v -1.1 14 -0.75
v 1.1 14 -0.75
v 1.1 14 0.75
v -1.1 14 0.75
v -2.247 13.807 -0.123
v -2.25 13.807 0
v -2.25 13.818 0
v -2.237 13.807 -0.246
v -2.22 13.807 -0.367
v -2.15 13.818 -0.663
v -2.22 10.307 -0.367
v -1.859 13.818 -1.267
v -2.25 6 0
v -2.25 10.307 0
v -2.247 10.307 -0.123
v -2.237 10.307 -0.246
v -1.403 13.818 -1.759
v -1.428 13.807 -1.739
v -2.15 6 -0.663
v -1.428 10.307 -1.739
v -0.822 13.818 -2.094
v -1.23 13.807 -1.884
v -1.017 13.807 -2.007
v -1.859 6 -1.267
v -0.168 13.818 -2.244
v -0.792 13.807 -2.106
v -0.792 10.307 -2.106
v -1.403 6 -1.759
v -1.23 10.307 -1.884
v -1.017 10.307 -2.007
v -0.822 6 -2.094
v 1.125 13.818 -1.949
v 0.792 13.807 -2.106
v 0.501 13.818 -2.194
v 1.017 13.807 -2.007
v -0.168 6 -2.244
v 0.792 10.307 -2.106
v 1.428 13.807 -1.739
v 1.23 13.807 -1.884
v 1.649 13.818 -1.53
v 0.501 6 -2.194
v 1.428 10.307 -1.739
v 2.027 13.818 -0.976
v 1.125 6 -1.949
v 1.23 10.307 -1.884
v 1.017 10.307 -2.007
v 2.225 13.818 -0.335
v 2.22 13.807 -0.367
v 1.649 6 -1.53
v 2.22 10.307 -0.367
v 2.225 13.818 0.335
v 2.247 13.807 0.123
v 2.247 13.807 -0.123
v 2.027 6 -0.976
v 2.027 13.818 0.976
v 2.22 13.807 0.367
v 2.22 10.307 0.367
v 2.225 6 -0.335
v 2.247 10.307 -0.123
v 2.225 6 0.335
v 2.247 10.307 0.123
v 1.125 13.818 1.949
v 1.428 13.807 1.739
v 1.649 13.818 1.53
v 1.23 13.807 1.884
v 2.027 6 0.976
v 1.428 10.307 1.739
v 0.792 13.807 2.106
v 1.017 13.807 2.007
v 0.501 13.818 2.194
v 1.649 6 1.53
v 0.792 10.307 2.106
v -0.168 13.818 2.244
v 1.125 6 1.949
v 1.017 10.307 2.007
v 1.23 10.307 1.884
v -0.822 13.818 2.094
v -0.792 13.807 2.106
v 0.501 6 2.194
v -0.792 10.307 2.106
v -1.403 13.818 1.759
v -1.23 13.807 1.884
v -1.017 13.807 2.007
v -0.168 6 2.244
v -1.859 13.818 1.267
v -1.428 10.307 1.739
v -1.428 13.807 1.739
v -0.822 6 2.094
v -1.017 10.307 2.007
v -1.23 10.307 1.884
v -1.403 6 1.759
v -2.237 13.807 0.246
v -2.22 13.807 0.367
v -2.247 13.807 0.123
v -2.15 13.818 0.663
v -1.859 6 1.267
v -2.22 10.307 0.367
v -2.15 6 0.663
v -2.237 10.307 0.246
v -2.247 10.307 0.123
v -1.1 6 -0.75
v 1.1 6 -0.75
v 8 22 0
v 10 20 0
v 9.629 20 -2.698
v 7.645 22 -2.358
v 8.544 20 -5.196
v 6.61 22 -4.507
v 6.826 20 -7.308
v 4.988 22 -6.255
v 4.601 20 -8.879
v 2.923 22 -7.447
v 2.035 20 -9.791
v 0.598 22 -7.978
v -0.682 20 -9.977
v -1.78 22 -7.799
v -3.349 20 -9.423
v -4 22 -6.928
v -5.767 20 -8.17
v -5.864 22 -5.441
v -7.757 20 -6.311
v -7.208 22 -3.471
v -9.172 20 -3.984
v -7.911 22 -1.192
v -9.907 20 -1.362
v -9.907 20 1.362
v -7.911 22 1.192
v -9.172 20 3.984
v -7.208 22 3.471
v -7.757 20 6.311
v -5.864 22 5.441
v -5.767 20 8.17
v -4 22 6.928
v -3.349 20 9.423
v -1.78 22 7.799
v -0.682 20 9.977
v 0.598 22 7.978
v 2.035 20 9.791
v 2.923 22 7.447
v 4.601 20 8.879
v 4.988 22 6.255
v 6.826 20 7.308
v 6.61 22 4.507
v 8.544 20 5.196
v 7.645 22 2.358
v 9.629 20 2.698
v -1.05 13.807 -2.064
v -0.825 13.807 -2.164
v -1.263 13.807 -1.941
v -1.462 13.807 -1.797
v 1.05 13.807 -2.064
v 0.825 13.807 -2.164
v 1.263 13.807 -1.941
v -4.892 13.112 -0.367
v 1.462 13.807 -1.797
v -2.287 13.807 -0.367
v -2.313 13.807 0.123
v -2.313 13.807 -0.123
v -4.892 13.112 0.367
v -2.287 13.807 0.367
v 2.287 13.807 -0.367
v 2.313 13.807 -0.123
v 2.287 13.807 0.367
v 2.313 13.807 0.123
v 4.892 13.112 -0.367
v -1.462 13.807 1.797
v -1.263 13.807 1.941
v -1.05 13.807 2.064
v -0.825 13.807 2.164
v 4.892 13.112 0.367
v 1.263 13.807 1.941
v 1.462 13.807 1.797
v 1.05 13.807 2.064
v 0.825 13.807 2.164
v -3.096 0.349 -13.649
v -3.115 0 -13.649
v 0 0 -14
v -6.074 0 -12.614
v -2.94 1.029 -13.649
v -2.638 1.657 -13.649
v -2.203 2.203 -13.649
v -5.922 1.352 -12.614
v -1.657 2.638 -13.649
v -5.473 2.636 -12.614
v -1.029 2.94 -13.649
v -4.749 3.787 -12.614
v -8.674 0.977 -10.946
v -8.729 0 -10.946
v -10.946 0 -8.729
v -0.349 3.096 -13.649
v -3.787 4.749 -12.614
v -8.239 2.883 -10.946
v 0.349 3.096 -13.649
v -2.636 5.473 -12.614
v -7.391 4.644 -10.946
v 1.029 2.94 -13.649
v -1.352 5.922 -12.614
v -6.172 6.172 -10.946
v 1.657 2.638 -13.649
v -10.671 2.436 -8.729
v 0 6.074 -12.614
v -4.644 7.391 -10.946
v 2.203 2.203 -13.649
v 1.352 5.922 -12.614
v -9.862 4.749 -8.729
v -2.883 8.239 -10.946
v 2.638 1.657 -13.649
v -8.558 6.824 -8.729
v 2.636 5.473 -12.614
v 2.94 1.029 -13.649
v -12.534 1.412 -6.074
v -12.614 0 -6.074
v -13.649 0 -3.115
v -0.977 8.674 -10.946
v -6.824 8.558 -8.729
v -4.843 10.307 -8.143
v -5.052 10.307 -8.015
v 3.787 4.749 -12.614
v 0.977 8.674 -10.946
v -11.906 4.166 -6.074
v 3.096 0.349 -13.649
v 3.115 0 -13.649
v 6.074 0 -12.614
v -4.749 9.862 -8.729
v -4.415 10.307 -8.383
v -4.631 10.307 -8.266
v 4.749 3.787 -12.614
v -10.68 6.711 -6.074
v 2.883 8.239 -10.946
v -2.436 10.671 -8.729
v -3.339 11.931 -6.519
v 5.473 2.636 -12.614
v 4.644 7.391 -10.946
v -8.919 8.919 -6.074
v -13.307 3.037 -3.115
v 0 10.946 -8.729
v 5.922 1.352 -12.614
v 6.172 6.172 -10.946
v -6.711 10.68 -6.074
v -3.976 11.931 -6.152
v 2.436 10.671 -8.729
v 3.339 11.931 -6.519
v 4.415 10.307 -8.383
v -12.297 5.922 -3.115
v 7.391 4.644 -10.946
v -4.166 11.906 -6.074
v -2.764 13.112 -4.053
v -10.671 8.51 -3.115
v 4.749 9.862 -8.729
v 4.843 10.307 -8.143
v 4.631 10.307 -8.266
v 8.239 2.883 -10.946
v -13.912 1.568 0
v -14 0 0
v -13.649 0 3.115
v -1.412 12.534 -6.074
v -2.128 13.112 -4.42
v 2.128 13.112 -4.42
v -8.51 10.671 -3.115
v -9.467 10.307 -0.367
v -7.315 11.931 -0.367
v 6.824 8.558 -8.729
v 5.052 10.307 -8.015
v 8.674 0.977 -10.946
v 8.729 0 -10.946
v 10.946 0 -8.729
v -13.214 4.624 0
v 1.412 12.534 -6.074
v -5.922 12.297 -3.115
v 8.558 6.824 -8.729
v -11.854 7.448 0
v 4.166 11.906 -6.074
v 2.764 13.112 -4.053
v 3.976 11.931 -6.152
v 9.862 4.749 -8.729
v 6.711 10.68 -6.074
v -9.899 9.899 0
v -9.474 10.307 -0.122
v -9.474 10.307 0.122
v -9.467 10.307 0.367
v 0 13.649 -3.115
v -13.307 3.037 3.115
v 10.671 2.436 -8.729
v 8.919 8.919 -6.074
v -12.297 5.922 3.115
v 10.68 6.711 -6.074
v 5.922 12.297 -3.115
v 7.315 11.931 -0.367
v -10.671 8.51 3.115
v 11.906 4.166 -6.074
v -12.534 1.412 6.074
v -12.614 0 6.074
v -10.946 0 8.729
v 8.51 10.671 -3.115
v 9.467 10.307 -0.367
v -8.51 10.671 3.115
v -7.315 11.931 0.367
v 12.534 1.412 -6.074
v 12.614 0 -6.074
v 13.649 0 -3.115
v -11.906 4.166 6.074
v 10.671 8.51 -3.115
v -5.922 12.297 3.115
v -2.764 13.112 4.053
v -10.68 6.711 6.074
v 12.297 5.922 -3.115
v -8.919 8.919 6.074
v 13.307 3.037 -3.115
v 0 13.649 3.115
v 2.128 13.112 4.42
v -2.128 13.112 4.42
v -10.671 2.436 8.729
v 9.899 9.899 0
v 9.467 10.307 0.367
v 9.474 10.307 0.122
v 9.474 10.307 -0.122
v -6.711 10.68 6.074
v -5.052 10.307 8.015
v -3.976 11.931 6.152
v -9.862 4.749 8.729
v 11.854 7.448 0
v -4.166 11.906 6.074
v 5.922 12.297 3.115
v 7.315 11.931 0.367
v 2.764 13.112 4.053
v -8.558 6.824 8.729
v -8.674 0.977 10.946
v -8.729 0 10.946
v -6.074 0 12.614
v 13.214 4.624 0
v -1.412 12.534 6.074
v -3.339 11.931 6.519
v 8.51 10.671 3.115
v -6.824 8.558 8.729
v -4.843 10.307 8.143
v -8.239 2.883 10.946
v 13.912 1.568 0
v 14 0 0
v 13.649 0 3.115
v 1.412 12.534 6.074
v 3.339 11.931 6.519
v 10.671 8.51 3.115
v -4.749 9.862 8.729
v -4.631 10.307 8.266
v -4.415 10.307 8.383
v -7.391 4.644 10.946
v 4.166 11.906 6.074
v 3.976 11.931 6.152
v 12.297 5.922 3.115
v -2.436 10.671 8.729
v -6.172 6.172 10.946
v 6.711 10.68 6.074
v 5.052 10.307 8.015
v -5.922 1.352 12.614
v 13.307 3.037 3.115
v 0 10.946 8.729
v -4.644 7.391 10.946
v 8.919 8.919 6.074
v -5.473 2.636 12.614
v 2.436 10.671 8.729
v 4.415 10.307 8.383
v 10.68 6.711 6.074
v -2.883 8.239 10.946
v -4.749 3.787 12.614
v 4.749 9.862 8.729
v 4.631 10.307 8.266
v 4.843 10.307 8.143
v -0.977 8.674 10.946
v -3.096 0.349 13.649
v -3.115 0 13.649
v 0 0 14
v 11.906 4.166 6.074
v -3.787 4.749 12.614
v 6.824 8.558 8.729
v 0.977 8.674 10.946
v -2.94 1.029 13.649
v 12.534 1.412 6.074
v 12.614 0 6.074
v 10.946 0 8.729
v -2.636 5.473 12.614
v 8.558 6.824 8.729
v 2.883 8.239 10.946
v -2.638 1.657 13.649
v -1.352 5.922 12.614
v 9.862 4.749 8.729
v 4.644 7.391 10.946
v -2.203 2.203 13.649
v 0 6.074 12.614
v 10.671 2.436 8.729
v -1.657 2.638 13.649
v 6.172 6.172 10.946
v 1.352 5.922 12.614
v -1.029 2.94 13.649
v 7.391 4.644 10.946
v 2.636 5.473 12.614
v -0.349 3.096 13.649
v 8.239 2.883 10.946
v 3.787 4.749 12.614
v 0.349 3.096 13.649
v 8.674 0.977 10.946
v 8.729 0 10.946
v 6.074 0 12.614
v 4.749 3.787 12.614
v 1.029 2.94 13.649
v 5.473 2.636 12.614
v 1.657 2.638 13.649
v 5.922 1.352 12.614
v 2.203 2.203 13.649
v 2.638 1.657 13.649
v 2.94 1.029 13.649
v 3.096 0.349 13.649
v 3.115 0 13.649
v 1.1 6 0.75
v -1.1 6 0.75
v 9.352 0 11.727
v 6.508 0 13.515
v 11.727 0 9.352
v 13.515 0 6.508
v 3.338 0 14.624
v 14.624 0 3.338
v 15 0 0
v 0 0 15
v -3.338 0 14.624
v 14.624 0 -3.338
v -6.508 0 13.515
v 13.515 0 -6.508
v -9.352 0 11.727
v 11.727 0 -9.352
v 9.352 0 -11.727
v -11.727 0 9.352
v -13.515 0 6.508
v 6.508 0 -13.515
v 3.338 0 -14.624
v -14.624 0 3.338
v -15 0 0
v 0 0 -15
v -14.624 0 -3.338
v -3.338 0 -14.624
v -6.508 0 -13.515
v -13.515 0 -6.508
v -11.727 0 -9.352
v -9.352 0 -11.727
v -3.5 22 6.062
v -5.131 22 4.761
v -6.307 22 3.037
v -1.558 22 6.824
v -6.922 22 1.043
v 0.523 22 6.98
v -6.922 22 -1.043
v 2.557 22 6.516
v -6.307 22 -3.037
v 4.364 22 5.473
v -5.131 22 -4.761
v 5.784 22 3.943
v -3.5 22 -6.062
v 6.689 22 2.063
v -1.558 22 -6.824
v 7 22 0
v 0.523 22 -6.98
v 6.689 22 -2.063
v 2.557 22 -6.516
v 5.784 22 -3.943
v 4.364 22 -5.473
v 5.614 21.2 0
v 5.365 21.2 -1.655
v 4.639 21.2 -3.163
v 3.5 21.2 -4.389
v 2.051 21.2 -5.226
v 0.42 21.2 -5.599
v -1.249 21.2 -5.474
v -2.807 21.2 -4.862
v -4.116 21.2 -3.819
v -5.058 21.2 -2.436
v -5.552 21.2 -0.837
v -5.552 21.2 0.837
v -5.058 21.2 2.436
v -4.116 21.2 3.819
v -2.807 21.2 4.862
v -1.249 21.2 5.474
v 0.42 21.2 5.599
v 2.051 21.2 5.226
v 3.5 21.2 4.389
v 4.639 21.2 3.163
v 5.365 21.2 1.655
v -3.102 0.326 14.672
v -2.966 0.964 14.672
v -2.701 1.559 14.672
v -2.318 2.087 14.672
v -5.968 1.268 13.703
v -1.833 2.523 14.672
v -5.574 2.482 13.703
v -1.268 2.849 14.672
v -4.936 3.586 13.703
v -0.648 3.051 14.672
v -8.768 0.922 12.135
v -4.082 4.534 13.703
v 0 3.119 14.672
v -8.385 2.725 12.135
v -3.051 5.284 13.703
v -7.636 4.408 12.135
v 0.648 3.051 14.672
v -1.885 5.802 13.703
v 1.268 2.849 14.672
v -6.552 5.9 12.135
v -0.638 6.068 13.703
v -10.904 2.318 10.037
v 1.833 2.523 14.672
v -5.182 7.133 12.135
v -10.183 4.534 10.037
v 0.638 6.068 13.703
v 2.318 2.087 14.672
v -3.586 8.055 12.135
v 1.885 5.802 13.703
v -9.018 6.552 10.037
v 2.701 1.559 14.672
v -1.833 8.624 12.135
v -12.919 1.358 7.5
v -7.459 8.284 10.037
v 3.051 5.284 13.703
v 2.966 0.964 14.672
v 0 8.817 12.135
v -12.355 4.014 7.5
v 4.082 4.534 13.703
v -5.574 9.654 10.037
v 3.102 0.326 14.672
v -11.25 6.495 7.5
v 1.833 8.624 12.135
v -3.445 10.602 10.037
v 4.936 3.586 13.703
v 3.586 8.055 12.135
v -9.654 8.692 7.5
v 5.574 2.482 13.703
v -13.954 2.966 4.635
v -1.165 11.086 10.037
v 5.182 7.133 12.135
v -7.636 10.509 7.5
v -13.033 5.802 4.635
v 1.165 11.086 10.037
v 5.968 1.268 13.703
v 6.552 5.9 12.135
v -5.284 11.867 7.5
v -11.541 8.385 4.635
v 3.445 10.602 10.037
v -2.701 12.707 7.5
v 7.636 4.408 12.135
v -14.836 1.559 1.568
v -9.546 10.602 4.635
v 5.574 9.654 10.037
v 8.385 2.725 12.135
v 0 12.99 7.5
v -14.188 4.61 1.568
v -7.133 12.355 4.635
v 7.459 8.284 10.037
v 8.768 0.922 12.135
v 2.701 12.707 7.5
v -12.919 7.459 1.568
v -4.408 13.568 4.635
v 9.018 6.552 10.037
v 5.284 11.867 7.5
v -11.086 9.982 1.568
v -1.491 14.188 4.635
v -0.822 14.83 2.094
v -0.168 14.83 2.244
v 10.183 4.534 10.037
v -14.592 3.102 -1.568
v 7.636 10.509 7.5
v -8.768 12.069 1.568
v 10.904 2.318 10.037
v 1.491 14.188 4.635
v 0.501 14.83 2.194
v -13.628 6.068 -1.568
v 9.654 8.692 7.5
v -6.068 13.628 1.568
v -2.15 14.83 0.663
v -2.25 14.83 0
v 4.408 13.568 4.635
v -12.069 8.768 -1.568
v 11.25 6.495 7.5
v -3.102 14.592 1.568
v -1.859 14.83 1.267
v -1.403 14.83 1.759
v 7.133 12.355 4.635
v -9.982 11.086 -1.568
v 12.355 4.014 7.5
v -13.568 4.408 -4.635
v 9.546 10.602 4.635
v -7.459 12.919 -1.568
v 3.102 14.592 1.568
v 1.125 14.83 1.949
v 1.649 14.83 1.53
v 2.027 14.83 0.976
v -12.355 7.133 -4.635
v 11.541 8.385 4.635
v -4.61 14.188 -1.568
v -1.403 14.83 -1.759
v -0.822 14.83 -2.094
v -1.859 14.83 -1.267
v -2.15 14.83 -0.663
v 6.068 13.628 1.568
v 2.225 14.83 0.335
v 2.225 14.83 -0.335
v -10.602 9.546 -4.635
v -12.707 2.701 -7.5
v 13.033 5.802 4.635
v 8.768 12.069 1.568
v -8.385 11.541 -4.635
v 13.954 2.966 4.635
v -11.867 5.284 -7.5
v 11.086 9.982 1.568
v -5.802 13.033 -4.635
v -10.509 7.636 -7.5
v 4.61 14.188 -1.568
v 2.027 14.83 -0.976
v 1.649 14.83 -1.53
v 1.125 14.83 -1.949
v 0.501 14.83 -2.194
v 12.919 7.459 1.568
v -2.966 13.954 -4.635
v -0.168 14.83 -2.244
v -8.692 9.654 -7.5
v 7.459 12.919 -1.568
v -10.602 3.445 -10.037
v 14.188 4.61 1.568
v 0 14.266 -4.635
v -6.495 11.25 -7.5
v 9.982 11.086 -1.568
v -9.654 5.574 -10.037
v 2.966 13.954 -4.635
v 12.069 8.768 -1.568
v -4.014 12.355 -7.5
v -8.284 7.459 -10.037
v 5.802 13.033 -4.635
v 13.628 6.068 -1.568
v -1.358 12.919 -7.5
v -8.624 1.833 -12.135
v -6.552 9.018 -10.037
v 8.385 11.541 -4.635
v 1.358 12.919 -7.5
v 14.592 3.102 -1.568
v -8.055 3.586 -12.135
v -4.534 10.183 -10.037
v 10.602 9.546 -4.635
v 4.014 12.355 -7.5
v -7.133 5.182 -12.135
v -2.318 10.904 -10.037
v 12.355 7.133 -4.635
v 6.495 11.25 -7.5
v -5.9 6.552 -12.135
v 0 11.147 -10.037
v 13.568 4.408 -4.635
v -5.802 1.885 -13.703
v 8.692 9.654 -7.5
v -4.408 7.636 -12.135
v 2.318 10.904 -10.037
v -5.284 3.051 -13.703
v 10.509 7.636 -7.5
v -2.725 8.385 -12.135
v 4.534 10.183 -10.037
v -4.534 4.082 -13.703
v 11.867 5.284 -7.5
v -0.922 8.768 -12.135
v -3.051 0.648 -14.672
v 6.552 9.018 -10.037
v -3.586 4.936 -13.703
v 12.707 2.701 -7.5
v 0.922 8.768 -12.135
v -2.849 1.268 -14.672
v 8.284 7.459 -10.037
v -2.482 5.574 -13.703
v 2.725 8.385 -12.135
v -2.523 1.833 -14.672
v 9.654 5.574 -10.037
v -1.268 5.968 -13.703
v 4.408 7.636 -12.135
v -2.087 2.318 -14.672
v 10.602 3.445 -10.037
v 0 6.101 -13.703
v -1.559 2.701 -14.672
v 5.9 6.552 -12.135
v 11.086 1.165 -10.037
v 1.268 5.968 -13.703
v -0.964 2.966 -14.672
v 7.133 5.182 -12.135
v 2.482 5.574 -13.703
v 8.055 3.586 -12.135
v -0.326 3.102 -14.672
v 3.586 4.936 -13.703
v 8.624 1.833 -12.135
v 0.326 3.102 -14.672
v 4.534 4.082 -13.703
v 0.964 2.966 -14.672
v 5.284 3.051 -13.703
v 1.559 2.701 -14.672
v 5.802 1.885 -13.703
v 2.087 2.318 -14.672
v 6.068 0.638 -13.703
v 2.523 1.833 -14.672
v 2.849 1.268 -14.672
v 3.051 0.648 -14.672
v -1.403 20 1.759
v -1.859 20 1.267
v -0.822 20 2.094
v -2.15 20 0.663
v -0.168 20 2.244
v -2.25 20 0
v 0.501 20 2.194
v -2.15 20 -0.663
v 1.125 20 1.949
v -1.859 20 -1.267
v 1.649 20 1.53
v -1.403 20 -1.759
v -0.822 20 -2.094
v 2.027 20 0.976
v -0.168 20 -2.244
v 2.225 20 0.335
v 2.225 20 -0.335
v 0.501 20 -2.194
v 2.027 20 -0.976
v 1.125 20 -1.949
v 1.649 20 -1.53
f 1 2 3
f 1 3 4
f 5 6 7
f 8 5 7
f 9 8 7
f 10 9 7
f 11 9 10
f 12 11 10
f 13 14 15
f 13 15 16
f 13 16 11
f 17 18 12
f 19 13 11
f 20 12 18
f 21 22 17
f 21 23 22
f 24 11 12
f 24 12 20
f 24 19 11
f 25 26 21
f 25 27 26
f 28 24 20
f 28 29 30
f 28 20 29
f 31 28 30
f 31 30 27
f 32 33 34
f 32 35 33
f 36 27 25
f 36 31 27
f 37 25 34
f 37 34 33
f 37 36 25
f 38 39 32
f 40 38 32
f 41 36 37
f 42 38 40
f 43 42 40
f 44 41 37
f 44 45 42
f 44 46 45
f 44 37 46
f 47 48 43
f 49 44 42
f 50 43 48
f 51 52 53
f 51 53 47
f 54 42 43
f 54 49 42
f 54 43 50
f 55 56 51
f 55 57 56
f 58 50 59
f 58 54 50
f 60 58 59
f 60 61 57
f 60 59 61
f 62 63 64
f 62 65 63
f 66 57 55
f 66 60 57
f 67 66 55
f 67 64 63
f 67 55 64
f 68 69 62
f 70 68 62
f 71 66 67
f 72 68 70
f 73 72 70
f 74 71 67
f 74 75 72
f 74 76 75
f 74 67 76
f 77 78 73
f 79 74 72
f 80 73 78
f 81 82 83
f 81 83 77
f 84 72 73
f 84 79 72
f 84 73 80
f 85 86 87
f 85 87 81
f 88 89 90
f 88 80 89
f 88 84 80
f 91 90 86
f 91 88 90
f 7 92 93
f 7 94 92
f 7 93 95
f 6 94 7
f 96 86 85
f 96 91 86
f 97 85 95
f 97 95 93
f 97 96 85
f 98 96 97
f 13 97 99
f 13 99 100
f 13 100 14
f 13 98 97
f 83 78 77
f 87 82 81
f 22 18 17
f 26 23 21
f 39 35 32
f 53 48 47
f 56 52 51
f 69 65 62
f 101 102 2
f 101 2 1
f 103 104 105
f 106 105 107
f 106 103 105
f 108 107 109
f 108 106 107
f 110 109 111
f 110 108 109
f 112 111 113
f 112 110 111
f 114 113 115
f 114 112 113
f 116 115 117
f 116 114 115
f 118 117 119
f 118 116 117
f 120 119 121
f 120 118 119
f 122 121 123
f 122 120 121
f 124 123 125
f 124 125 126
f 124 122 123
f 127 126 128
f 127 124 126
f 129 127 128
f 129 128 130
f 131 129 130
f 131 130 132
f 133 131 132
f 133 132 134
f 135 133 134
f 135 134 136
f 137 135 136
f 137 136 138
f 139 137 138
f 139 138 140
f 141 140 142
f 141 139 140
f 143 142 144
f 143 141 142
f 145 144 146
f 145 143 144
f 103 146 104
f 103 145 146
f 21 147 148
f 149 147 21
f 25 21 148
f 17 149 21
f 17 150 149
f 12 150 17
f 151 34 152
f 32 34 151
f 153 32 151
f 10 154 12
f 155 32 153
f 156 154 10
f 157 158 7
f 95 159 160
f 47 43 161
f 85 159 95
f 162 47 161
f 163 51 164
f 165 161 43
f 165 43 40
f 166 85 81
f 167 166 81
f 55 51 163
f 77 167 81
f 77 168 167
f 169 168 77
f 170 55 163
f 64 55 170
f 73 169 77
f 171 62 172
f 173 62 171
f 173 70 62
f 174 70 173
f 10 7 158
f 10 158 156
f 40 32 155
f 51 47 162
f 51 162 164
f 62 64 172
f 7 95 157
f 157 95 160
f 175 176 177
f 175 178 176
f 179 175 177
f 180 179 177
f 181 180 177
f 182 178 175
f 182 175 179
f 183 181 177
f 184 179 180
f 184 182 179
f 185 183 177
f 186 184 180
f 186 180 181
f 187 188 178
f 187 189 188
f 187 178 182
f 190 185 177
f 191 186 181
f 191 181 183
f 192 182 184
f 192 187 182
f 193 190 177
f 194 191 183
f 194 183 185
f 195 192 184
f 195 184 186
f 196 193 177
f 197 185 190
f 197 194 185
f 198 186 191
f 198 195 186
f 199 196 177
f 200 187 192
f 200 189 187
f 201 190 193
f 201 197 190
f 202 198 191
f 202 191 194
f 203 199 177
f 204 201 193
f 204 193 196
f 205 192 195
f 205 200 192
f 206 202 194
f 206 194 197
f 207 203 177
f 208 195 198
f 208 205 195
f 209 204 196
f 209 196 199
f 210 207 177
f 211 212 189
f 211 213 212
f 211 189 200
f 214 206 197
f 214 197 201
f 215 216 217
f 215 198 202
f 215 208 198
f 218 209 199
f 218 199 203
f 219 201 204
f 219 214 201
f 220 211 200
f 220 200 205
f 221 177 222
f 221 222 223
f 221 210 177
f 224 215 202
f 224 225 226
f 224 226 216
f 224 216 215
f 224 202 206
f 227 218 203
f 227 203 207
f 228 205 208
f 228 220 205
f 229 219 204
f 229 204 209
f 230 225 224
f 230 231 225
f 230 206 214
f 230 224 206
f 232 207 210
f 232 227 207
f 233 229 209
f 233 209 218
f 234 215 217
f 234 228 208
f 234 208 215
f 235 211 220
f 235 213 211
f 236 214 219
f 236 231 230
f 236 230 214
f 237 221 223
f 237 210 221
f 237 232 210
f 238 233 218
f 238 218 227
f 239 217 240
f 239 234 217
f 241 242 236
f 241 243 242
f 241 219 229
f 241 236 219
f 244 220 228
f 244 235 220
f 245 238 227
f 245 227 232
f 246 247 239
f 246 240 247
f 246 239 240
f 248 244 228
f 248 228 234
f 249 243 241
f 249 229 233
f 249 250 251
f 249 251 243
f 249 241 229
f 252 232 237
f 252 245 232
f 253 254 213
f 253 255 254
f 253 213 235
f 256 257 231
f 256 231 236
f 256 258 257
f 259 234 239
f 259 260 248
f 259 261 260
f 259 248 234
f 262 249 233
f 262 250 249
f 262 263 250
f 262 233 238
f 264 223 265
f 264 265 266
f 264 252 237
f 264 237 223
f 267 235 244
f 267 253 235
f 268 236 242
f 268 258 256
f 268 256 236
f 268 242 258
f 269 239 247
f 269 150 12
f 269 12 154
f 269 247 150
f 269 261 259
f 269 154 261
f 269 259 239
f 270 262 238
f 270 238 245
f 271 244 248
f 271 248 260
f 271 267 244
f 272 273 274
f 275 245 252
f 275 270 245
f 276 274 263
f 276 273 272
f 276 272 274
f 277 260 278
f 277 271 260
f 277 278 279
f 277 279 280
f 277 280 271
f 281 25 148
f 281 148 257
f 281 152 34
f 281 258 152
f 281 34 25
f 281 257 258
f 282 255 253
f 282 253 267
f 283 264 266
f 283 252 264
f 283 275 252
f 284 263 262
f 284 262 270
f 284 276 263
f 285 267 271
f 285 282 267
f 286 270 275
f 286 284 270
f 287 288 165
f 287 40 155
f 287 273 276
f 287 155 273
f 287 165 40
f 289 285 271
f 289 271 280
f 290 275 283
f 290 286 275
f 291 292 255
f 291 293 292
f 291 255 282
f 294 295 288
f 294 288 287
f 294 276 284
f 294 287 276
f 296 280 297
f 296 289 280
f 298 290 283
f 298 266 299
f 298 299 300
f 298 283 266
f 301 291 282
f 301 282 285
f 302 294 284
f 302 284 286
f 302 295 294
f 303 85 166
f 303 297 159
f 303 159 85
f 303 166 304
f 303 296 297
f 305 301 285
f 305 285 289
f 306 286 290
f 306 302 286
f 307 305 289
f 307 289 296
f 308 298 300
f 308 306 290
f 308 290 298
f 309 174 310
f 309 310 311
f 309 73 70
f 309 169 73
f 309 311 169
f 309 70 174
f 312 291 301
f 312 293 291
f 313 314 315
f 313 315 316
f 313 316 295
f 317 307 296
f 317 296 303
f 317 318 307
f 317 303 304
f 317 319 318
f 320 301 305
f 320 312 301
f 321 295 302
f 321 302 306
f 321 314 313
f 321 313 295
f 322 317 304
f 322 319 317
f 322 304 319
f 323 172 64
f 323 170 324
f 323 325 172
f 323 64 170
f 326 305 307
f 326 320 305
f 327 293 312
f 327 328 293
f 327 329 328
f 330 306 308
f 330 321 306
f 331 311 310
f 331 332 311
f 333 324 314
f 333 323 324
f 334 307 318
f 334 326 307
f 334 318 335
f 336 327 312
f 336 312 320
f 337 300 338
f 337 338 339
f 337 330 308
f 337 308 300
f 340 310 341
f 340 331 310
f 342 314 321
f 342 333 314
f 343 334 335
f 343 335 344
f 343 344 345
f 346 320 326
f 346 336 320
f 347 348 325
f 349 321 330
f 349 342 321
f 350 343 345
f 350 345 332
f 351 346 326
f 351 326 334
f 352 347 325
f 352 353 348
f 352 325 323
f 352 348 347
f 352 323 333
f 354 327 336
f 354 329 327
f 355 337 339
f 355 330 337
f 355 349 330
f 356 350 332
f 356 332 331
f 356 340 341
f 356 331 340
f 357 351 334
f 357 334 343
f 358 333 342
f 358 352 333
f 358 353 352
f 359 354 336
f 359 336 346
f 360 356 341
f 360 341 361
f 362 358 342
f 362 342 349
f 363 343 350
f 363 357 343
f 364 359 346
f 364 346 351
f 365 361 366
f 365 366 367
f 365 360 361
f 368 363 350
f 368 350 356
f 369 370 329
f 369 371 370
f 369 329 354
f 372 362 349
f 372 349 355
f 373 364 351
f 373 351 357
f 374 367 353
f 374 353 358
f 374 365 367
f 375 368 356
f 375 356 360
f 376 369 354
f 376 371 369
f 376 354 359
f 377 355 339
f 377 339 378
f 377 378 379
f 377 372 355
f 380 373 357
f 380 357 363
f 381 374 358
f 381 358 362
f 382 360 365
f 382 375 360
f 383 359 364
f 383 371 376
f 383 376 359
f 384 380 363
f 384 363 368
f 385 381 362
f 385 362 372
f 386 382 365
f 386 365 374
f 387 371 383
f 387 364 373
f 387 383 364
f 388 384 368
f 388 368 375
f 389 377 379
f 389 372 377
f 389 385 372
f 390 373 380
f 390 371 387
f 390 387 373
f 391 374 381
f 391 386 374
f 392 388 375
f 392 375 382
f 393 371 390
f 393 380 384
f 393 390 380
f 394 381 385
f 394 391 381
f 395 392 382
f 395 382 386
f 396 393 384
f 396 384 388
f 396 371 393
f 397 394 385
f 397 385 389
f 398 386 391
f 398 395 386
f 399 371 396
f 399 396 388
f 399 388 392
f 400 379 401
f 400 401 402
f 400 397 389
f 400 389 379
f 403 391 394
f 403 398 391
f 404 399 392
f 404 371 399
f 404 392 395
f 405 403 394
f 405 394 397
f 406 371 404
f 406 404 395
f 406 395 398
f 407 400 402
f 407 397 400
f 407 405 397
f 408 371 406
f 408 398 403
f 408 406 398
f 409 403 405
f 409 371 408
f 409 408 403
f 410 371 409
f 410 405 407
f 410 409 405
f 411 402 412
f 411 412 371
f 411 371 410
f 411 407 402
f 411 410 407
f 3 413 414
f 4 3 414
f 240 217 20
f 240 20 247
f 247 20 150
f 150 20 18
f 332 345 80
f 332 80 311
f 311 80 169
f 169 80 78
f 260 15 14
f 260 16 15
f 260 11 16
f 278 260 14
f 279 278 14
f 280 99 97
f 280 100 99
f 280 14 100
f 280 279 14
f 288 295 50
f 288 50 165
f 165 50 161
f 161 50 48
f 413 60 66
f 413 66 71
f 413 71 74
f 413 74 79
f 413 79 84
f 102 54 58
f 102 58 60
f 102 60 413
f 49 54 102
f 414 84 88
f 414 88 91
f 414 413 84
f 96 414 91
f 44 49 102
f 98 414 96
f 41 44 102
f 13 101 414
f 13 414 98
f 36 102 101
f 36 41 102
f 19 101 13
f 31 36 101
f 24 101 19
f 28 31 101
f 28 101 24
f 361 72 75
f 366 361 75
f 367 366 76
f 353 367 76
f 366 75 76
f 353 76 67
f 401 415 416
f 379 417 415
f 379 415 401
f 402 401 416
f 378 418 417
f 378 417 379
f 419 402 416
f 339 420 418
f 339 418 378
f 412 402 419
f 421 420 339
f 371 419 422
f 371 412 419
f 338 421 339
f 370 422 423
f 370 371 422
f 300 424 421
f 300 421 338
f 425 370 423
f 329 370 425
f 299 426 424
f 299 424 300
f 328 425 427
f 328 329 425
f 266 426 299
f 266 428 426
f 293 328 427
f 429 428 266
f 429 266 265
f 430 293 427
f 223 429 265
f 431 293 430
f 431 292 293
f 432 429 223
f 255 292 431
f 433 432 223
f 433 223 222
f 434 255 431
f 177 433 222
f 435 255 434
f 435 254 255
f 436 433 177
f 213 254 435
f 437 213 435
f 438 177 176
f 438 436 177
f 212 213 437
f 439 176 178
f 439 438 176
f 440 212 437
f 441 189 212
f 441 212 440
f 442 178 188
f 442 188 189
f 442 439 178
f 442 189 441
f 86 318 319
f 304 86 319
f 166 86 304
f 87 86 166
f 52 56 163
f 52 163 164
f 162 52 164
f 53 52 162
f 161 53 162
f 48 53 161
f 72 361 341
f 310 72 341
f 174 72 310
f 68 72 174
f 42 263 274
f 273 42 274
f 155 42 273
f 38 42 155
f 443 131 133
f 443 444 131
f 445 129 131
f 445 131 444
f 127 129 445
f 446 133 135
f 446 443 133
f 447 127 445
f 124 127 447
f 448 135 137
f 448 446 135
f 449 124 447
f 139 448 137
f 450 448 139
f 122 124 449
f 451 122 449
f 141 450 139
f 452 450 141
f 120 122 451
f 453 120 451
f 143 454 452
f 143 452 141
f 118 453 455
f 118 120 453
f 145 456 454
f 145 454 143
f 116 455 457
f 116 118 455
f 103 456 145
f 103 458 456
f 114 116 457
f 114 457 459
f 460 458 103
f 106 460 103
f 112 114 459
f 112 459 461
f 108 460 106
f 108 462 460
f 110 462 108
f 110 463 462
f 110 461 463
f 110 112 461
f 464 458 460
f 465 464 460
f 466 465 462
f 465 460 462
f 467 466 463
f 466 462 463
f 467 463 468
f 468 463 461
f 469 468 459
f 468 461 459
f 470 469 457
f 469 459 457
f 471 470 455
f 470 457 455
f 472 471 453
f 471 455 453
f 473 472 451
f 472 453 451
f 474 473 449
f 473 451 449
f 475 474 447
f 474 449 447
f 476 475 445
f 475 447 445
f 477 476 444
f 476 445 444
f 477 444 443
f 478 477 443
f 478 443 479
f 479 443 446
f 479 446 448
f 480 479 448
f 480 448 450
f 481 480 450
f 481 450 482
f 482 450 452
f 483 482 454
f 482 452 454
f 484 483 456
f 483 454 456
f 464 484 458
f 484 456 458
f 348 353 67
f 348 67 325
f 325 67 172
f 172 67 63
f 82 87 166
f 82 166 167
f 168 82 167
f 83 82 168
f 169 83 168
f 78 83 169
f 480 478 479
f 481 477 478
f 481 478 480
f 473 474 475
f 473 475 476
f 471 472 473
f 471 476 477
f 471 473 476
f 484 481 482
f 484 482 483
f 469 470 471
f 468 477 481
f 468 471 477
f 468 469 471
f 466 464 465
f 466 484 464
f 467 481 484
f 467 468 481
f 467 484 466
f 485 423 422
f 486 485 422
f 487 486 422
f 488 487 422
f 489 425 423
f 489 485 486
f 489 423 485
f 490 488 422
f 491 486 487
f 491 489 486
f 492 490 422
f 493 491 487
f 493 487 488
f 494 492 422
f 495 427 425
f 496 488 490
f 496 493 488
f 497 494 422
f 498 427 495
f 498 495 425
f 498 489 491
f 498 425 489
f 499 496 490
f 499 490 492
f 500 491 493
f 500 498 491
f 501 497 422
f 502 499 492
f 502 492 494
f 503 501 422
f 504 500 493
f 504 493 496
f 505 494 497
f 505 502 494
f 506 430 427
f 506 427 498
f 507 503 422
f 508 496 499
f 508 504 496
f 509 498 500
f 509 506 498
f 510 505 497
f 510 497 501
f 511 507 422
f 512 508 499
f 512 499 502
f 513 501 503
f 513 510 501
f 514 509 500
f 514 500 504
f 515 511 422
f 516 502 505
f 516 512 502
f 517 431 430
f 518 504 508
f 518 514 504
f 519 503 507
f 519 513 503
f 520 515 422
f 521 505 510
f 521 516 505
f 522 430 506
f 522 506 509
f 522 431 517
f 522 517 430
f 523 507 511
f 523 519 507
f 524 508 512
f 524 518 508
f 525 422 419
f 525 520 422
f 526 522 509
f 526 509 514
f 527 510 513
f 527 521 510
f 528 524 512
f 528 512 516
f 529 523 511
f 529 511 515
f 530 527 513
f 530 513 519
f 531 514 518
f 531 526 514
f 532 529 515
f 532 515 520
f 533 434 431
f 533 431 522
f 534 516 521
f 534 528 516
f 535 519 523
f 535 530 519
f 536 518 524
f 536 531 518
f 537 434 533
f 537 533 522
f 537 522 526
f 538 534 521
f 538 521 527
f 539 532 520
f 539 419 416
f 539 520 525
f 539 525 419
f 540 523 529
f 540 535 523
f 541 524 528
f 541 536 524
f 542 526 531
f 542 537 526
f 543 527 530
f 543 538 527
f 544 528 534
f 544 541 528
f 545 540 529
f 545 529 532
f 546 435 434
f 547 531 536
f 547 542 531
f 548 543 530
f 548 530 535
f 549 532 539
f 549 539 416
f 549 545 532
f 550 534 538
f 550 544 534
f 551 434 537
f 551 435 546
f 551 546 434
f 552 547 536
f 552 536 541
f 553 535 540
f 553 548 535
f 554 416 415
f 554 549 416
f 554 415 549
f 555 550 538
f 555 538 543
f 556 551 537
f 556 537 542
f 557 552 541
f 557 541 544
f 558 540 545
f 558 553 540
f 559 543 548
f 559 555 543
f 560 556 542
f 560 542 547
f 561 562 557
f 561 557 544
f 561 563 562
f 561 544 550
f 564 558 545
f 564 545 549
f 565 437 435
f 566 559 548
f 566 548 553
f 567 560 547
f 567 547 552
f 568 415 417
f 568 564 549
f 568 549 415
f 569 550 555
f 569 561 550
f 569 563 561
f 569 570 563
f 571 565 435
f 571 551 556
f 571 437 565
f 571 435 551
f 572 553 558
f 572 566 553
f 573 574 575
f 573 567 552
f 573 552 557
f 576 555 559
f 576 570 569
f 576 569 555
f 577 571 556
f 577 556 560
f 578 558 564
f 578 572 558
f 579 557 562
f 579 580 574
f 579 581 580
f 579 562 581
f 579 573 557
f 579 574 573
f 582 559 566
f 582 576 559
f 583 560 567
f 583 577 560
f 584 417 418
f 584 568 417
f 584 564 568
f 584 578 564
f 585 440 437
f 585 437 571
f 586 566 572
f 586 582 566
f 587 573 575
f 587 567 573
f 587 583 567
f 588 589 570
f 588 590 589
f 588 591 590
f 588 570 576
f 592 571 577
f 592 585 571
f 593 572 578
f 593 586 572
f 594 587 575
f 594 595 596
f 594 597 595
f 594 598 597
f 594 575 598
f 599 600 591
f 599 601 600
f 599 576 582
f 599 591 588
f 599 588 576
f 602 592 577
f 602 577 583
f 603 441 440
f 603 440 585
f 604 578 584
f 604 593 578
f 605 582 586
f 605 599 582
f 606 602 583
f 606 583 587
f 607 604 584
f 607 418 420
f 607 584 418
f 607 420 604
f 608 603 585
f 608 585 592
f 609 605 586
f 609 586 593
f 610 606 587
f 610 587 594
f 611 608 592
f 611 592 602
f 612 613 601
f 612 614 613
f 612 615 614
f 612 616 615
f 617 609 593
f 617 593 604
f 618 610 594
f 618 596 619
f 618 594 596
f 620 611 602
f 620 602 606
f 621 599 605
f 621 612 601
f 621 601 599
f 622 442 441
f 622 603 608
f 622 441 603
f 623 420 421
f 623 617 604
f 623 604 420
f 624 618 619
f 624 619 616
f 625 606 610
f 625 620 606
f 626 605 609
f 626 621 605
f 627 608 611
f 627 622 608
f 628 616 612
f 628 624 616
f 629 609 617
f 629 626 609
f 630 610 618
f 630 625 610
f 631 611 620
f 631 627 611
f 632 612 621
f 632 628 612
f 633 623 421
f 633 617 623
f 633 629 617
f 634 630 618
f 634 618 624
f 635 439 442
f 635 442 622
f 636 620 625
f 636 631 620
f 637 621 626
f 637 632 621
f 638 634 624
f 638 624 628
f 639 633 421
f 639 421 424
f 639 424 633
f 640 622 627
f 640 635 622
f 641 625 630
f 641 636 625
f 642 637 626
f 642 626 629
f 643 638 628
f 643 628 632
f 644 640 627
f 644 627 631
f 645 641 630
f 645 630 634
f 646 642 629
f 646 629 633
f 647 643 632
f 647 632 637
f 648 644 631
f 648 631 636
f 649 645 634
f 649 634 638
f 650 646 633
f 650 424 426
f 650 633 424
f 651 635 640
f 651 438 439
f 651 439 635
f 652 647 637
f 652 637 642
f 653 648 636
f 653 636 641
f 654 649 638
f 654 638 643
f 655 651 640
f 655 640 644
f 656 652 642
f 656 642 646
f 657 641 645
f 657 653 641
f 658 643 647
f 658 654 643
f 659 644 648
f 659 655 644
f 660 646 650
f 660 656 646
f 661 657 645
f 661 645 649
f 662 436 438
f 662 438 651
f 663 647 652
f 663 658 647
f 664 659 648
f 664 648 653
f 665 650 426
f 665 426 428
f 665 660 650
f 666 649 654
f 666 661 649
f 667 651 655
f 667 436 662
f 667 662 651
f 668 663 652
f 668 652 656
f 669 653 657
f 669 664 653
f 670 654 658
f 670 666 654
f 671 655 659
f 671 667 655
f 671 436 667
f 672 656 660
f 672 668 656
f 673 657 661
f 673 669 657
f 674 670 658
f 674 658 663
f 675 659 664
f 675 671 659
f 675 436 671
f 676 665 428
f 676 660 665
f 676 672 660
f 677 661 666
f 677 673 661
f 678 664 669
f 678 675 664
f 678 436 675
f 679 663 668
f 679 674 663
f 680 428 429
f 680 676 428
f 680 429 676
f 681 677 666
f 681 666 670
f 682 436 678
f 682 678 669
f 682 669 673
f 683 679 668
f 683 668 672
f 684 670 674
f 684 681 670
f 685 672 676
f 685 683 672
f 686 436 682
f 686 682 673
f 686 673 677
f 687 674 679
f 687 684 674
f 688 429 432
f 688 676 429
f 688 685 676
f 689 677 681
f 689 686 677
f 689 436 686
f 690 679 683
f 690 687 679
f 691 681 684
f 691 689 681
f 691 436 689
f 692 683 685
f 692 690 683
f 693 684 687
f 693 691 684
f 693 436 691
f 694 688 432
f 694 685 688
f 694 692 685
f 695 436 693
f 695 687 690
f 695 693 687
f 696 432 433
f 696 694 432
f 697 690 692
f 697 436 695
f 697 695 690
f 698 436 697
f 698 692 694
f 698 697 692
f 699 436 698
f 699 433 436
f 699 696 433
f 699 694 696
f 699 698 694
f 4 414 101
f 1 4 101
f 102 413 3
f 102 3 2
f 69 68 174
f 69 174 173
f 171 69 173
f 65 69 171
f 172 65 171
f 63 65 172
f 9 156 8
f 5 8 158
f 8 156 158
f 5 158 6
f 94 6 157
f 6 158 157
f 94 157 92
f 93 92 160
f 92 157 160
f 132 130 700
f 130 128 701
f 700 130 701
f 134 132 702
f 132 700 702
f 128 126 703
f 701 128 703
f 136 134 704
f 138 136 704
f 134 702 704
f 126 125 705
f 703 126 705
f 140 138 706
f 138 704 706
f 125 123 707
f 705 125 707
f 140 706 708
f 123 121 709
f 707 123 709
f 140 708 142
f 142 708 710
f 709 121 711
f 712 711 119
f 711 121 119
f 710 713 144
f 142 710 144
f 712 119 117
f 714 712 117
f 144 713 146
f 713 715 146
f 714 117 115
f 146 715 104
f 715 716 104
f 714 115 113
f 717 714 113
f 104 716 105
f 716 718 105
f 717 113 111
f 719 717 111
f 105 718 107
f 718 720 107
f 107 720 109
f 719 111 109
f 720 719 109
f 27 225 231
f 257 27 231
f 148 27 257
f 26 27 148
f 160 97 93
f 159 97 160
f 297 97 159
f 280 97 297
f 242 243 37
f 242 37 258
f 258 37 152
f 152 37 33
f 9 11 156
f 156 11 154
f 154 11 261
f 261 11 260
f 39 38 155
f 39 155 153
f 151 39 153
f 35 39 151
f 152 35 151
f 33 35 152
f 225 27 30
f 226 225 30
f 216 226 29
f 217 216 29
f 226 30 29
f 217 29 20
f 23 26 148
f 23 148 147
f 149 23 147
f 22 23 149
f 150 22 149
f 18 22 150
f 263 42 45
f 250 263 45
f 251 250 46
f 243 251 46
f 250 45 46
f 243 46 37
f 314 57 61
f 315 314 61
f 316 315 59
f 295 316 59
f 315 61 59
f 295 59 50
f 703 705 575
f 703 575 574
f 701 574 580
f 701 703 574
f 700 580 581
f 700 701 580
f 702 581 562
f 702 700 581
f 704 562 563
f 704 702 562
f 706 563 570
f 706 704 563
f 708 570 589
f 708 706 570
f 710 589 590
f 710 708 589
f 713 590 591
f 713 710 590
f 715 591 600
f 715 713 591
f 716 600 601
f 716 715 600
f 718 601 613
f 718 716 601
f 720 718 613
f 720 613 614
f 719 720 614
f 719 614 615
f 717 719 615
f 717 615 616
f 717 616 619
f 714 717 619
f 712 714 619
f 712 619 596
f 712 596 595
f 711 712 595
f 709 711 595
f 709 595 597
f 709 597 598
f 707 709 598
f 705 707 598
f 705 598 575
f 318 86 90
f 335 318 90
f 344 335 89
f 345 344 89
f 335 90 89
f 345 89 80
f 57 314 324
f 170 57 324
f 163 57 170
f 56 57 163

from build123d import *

# Parameters (mm, degrees)
REVOLVE2_ANGLE                       = 180
BOSS_EXTRUDE4_REACH                  = 31.155
BOSS_EXTRUDE4_END_RADIUS             = 15
SKETCH6_R                            = 2.25
SKETCH7_R                            = 10
BOSS_EXTRUDE6_DEPTH                  = 2
BOSS_EXTRUDE6_TAPER                  = 45
SKETCH8_R                            = 7
CUT_EXTRUDE1_DEPTH                   = 0.8
CUT_EXTRUDE1_DRAFT                   = -60
SKETCH3_W                            = 2.2
SKETCH3_H                            = 1.5
CUT_EXTRUDE4_DEPTH                   = 8
BOSS_EXTRUDE7_REACH                  = 28.571
BOSS_EXTRUDE7_END_RADIUS             = 14
SKETCH10_R                           = 2.25
SKETCH10_W                           = 2.2
SKETCH10_H                           = 1.5
BOSS_EXTRUDE9_REACH                  = 33.726
BOSS_EXTRUDE9_END_RADIUS             = 14
SKETCH12_W                           = 0.734734754
SKETCH12_H                           = 3.5
BOSS_EXTRUDE9_DIRECTION_2_REACH      = 33.726
BOSS_EXTRUDE9_DIRECTION_2_END_RADIUS = 2.25
CIRPATTERN1_COUNT                    = 6


with BuildPart() as part:
    # Sketch1 → Revolve2 (revolve)
    with BuildSketch(Plane(origin=(0, 0, 0), x_dir=(1, 0, 0), z_dir=(0, 1, 0))):
        with BuildLine():
            Line((0, -14), (0, -15))
            ThreePointArc((0, -15), (-15, 0), (0, 15))
            Line((0, 15), (0, 14))
            ThreePointArc((0, 14), (-14, 0), (0, -14))
        make_face()
    revolve(axis=Axis((0, 0, -14), (0, 0, -1)), revolution_arc=REVOLVE2_ANGLE)

    # Boss-Extrude4: up to this sphere (the profile starts outside it)
    boss_extrude4_end = Location((0, 0, 0)) * Sphere(BOSS_EXTRUDE4_END_RADIUS, mode=Mode.PRIVATE)
    # Sketch6 → Boss-Extrude4 (add, up to the surface)
    with BuildSketch(Plane(origin=(0, 20, 0), x_dir=(1, 0, 0), z_dir=(0, 1, 0)), mode=Mode.PRIVATE) as boss_extrude4_sk1:
        with Locations(Location((0, 0, 0), (0, 0, 180))):
            Circle(SKETCH6_R)
    boss_extrude4_tool1 = extrude(boss_extrude4_sk1.sketch, amount=-BOSS_EXTRUDE4_REACH, mode=Mode.PRIVATE) - boss_extrude4_end
    add(boss_extrude4_tool1.solids().sort_by_distance((0, 20, 0))[0])

    # Sketch7 → Boss-Extrude6 (add)
    with BuildSketch(Plane(origin=(0, 20, 0), x_dir=(1, 0, 0), z_dir=(0, 1, 0))):
        Circle(SKETCH7_R)
    extrude(amount=BOSS_EXTRUDE6_DEPTH, taper=BOSS_EXTRUDE6_TAPER)


with BuildPart() as cut_extrude1_tool:
    # Sketch8 → Cut-Extrude1 (with draft: the straight prism first)
    with BuildSketch(Plane(origin=(0, 22, 0), x_dir=(1, 0, 0), z_dir=(0, 1, 0))):
        Circle(SKETCH8_R)
    extrude(amount=-CUT_EXTRUDE1_DEPTH)
    # Cut-Extrude1: the draft: its side faces are tilted about the plane it starts from
    cut_extrude1_sides = [cut_extrude1_tool.faces().sort_by_distance(p)[0] for p in [
        (-7, 21.6, 0),
    ]]
    draft(cut_extrude1_sides, Plane(origin=(0, 22, 0), x_dir=(1, 0, 0), z_dir=(0, 1, 0)), CUT_EXTRUDE1_DRAFT)


with BuildPart() as part_1:
    add(part.part)

    # Cut-Extrude1: cut by cut_extrude1_tool
    add(cut_extrude1_tool.part, mode=Mode.SUBTRACT)

    # Sketch3 → Cut-Extrude4 (cut)
    with BuildSketch(Plane(origin=(0, 6, 0), x_dir=(-1, 0, 0), z_dir=(0, -1, 0))):
        Rectangle(SKETCH3_W, SKETCH3_H)
    extrude(amount=-CUT_EXTRUDE4_DEPTH, mode=Mode.SUBTRACT)

    # Boss-Extrude7: up to this sphere (the profile starts inside it)
    boss_extrude7_end = Location((0, 0, 0)) * Sphere(BOSS_EXTRUDE7_END_RADIUS, mode=Mode.PRIVATE)
    # Sketch10 → Boss-Extrude7 (add, up to the surface)
    with BuildSketch(Plane(origin=(0, 6, 0), x_dir=(-1, 0, 0), z_dir=(0, -1, 0)), mode=Mode.PRIVATE) as boss_extrude7_sk1:
        Circle(SKETCH10_R)
        Rectangle(SKETCH10_W, SKETCH10_H, mode=Mode.SUBTRACT)
    boss_extrude7_tool1 = extrude(boss_extrude7_sk1.sketch, amount=-BOSS_EXTRUDE7_REACH, mode=Mode.PRIVATE) & boss_extrude7_end
    add(boss_extrude7_tool1.solids().sort_by_distance((2.18636, 6, 0))[0])

    # Boss-Extrude9: up to this sphere (the profile starts inside it)
    boss_extrude9_end = Location((0, 0, 0)) * Sphere(BOSS_EXTRUDE9_END_RADIUS, mode=Mode.PRIVATE)
    # Sketch12 → Boss-Extrude9 (add, up to the surface)
    with BuildSketch(Plane.ZY.offset(2.25), mode=Mode.PRIVATE) as boss_extrude9_sk1:
        with Locations((0, 12.057093613)):
            Rectangle(SKETCH12_W, SKETCH12_H)
    boss_extrude9_tool1 = extrude(boss_extrude9_sk1.sketch, amount=BOSS_EXTRUDE9_REACH, mode=Mode.PRIVATE) & boss_extrude9_end
    boss_extrude9 = boss_extrude9_tool1.solids().sort_by_distance((-2.25, 12.057094, 0))[0]
    add(boss_extrude9)

    # Boss-Extrude9 direction 2: up to this cylinder (the profile starts outside it)
    boss_extrude9_direction_2_end = Plane(origin=(0, 12.057094, 0), z_dir=(0, -1, 0)) * Cylinder(BOSS_EXTRUDE9_DIRECTION_2_END_RADIUS, 72.952, mode=Mode.PRIVATE)
    # Sketch12 → Boss-Extrude9 direction 2 (add, up to the surface)
    with BuildSketch(Plane.ZY.offset(2.25), mode=Mode.PRIVATE) as boss_extrude9_direction_2_sk1:
        with Locations((0, 12.057093613)):
            Rectangle(SKETCH12_W, SKETCH12_H)
    boss_extrude9_direction_2_tool1 = extrude(boss_extrude9_direction_2_sk1.sketch, amount=-BOSS_EXTRUDE9_DIRECTION_2_REACH, mode=Mode.PRIVATE) - boss_extrude9_direction_2_end
    boss_extrude9_direction_2 = boss_extrude9_direction_2_tool1.solids().sort_by_distance((-2.25, 12.057094, 0))[0] + boss_extrude9_direction_2_tool1.solids().sort_by_distance((-2.25, 12.057094, 0))[1]
    add(boss_extrude9_direction_2)
    boss_extrude9 = boss_extrude9 + boss_extrude9_direction_2  # both directions under the feature's name, for the pattern or mirror that repeats it

    # CirPattern1: Boss-Extrude9 ×6 about axis
    cirpattern1_axis = Axis((0, 0, 0), (0, 1, 0))
    for i in range(1, CIRPATTERN1_COUNT):
        add(boss_extrude9.rotate(cirpattern1_axis, i * 360 / CIRPATTERN1_COUNT))


solid = part_1.part
